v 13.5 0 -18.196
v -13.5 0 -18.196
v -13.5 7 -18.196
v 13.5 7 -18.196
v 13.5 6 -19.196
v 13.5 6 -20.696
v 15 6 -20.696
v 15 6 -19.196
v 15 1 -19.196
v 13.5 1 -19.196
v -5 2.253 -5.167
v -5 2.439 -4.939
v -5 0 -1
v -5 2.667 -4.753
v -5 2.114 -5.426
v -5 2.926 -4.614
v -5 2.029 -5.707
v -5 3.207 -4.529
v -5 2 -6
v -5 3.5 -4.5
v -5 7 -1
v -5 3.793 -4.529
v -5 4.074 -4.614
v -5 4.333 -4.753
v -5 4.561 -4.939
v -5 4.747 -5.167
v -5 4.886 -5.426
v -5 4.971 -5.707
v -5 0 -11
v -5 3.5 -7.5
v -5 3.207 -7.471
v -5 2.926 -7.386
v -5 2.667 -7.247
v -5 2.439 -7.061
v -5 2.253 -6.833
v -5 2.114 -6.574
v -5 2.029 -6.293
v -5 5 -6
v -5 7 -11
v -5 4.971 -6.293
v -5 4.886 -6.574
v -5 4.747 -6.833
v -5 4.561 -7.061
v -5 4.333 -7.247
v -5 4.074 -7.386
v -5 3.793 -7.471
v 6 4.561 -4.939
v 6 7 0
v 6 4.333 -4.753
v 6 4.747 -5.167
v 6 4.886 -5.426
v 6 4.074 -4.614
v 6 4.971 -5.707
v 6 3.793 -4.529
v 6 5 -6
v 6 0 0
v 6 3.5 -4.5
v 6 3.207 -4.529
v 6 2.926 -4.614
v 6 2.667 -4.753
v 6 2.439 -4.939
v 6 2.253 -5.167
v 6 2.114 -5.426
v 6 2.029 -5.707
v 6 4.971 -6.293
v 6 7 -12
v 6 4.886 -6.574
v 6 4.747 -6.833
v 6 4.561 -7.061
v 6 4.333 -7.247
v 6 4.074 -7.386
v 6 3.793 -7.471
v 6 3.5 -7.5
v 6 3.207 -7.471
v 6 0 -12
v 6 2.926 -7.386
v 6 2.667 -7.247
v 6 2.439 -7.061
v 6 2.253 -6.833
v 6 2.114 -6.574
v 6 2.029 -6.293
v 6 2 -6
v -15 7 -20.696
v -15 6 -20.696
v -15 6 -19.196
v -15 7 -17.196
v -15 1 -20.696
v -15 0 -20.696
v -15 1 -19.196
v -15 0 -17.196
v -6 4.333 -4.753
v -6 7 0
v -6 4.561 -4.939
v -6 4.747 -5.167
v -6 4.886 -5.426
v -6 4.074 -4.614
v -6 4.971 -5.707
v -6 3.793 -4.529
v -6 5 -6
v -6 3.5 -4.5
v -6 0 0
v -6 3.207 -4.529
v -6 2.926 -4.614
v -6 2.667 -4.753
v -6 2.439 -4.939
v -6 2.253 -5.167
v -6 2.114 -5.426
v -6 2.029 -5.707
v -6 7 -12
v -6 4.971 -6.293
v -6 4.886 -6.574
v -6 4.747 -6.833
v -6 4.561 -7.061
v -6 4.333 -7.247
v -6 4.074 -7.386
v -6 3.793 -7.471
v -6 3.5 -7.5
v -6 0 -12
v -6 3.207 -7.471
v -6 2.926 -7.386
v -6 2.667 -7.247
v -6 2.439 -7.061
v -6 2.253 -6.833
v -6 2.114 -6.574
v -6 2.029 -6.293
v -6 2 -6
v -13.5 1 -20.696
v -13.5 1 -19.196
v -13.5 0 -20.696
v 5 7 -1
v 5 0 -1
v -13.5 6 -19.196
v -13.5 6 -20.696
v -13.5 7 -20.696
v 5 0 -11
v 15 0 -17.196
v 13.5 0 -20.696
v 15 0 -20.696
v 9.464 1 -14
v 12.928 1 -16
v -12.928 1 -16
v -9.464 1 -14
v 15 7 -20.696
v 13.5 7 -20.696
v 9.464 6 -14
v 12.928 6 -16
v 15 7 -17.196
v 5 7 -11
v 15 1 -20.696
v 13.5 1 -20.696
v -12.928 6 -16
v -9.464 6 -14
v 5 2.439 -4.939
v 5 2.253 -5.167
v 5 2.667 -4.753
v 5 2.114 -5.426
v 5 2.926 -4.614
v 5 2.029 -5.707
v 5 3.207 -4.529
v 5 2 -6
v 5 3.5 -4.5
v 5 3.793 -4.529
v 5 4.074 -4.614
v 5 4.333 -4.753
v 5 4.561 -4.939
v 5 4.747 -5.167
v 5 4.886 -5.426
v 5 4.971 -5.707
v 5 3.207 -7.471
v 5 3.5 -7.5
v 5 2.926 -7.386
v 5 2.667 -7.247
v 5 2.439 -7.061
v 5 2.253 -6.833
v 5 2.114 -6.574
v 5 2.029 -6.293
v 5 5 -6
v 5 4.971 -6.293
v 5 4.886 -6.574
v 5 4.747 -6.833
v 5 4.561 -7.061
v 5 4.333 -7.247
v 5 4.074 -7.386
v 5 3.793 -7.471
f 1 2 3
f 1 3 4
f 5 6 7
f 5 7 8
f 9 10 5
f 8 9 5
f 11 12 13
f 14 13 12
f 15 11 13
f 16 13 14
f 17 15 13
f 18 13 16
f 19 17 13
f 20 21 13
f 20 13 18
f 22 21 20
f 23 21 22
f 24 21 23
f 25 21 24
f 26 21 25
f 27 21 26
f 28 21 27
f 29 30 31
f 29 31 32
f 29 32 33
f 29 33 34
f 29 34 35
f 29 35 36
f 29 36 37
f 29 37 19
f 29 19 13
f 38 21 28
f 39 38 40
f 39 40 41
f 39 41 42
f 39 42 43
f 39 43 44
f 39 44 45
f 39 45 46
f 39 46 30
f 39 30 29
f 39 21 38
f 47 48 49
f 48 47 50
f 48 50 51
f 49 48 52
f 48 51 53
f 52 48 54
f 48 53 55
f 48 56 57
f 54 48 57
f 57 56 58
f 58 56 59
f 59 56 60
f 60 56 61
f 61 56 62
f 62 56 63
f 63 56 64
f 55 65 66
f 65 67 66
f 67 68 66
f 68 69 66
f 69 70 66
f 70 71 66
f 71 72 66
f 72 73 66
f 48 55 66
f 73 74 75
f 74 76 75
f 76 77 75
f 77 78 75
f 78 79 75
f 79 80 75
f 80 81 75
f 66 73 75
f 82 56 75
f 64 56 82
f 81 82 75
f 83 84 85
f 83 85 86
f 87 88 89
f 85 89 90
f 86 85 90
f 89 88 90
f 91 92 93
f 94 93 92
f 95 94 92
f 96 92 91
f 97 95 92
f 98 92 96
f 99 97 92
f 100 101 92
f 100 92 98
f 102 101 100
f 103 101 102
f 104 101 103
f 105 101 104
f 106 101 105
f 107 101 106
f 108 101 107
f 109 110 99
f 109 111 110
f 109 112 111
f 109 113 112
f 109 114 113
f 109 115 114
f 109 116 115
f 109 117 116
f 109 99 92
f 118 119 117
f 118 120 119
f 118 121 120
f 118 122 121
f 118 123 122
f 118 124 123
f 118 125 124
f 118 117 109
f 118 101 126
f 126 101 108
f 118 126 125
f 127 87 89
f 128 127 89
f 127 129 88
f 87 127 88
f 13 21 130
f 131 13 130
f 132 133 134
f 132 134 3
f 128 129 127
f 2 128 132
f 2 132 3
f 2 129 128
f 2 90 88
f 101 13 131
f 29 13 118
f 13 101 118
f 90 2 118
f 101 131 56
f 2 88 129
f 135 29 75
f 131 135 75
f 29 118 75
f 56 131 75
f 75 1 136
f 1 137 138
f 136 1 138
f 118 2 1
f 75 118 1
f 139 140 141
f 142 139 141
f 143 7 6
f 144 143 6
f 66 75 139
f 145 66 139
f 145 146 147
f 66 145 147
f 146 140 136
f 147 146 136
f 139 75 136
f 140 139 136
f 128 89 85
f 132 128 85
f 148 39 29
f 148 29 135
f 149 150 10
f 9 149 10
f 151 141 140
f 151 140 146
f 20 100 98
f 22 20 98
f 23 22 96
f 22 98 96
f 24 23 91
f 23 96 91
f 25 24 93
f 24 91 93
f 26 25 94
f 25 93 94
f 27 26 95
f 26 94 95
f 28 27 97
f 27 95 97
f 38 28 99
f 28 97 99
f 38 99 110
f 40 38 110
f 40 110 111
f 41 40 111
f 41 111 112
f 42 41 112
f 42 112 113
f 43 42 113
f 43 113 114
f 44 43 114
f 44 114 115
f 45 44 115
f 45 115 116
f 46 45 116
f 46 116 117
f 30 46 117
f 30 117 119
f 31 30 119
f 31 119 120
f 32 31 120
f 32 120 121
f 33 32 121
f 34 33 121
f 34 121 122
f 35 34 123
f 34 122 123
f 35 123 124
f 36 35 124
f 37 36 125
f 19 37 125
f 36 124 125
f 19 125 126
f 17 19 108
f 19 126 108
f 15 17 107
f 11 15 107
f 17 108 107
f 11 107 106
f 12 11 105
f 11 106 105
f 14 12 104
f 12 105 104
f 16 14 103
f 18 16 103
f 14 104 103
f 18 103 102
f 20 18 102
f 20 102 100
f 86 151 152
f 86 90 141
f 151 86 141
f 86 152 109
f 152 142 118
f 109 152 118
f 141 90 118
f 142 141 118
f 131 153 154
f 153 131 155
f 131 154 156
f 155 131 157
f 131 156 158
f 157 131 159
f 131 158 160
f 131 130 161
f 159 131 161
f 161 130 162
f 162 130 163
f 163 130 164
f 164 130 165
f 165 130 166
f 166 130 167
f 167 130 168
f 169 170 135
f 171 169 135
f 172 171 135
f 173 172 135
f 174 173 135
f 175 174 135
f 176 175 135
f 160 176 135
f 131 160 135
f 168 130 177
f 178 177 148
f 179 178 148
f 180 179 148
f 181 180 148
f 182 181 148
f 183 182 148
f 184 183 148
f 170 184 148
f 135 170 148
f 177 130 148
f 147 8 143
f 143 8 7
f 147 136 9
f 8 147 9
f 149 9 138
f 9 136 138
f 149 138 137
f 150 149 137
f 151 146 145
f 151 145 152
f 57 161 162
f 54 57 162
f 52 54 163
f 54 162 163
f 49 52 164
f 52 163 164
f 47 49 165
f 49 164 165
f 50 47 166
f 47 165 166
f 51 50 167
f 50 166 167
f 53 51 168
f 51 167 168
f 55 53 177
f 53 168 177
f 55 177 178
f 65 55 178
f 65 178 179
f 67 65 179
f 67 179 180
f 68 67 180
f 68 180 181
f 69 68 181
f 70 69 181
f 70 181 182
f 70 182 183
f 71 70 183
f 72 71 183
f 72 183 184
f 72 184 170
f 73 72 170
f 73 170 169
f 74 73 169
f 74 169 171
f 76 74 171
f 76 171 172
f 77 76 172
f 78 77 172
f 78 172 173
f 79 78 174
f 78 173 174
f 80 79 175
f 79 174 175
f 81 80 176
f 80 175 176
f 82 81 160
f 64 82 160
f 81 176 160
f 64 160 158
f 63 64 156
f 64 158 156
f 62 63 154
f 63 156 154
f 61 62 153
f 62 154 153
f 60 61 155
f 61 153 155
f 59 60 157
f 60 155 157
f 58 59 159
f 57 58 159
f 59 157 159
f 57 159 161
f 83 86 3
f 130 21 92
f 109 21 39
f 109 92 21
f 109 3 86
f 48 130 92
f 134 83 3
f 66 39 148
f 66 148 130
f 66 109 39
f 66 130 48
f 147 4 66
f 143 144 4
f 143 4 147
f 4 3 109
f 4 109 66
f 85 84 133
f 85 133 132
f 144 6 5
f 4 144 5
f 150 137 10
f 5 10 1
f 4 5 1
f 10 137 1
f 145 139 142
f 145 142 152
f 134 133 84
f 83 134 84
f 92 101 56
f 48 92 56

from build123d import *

# Parameters (mm, degrees)
SKETCH_1_W          = 12
SKETCH_1_H          = 12
EXTRUDE_1_DEPTH     = 7
SKETCH_2_W          = 10
SKETCH_2_H          = 10
CUT_EXTRUDE_1_DEPTH = 8
SKETCH_4_R          = 1.5
CUT_EXTRUDE_2_DEPTH = 22
SKETCH_5_W          = 27
SKETCH_5_H          = 2.5
CUT_EXTRUDE_3_DEPTH = 8
SKETCH_6_W          = 2
SKETCH_6_H          = 5
CUT_EXTRUDE_4_DEPTH = 31
SKETCH_7_W          = 1.5
SKETCH_7_H          = 5
CUT_EXTRUDE_5_DEPTH = 31


with BuildPart() as part:
    # Эскиз1 → Бобышка-Вытянуть1 (new body)
    with BuildSketch(Plane(origin=(0, 0, 0), x_dir=(1, 0, 0), z_dir=(0, 1, 0))):
        with Locations((0, 6)):
            Rectangle(SKETCH_1_W, SKETCH_1_H)
        Polygon((-15, 17.196152423), (-6, 12), (6, 12), (15, 17.196152423), (15, 20.696152423), (-15, 20.696152423), align=None)
    extrude(amount=EXTRUDE_1_DEPTH)

    # Эскиз2 → Вырез-Вытянуть1 (cut, through all)
    with BuildSketch(Plane(origin=(0, 7, 0), x_dir=(1, 0, 0), z_dir=(0, 1, 0))):
        with Locations((0, 6)):
            Rectangle(SKETCH_2_W, SKETCH_2_H)
    extrude(amount=-CUT_EXTRUDE_1_DEPTH, mode=Mode.SUBTRACT)

    # Эскиз4 → Вырез-Вытянуть2 (cut, through all)
    with BuildSketch(Plane.ZY.offset(6)):
        with Locations((-6, 3.5)):
            Circle(SKETCH_4_R)
    extrude(amount=-CUT_EXTRUDE_2_DEPTH, mode=Mode.SUBTRACT)

    # Эскиз5 → Вырез-Вытянуть3 (cut, through all)
    with BuildSketch(Plane.XZ):
        with Locations((0, -19.446152423)):
            Rectangle(SKETCH_5_W, SKETCH_5_H)
    extrude(amount=-CUT_EXTRUDE_3_DEPTH, mode=Mode.SUBTRACT)

    # Эскиз6 → Вырез-Вытянуть4 (cut, through all)
    with BuildSketch(Plane(origin=(15, 0, 0), x_dir=(0, 0, -1), z_dir=(1, 0, 0))):
        with Locations((15, 3.5)):
            Rectangle(SKETCH_6_W, SKETCH_6_H)
    extrude(amount=-CUT_EXTRUDE_4_DEPTH, mode=Mode.SUBTRACT)

    # Эскиз7 → Вырез-Вытянуть5 (cut, through all)
    with BuildSketch(Plane.ZY.offset(15)):
        with Locations((-19.946152423, 3.5)):
            Rectangle(SKETCH_7_W, SKETCH_7_H)
    extrude(amount=-CUT_EXTRUDE_5_DEPTH, mode=Mode.SUBTRACT)


solid = part.part
